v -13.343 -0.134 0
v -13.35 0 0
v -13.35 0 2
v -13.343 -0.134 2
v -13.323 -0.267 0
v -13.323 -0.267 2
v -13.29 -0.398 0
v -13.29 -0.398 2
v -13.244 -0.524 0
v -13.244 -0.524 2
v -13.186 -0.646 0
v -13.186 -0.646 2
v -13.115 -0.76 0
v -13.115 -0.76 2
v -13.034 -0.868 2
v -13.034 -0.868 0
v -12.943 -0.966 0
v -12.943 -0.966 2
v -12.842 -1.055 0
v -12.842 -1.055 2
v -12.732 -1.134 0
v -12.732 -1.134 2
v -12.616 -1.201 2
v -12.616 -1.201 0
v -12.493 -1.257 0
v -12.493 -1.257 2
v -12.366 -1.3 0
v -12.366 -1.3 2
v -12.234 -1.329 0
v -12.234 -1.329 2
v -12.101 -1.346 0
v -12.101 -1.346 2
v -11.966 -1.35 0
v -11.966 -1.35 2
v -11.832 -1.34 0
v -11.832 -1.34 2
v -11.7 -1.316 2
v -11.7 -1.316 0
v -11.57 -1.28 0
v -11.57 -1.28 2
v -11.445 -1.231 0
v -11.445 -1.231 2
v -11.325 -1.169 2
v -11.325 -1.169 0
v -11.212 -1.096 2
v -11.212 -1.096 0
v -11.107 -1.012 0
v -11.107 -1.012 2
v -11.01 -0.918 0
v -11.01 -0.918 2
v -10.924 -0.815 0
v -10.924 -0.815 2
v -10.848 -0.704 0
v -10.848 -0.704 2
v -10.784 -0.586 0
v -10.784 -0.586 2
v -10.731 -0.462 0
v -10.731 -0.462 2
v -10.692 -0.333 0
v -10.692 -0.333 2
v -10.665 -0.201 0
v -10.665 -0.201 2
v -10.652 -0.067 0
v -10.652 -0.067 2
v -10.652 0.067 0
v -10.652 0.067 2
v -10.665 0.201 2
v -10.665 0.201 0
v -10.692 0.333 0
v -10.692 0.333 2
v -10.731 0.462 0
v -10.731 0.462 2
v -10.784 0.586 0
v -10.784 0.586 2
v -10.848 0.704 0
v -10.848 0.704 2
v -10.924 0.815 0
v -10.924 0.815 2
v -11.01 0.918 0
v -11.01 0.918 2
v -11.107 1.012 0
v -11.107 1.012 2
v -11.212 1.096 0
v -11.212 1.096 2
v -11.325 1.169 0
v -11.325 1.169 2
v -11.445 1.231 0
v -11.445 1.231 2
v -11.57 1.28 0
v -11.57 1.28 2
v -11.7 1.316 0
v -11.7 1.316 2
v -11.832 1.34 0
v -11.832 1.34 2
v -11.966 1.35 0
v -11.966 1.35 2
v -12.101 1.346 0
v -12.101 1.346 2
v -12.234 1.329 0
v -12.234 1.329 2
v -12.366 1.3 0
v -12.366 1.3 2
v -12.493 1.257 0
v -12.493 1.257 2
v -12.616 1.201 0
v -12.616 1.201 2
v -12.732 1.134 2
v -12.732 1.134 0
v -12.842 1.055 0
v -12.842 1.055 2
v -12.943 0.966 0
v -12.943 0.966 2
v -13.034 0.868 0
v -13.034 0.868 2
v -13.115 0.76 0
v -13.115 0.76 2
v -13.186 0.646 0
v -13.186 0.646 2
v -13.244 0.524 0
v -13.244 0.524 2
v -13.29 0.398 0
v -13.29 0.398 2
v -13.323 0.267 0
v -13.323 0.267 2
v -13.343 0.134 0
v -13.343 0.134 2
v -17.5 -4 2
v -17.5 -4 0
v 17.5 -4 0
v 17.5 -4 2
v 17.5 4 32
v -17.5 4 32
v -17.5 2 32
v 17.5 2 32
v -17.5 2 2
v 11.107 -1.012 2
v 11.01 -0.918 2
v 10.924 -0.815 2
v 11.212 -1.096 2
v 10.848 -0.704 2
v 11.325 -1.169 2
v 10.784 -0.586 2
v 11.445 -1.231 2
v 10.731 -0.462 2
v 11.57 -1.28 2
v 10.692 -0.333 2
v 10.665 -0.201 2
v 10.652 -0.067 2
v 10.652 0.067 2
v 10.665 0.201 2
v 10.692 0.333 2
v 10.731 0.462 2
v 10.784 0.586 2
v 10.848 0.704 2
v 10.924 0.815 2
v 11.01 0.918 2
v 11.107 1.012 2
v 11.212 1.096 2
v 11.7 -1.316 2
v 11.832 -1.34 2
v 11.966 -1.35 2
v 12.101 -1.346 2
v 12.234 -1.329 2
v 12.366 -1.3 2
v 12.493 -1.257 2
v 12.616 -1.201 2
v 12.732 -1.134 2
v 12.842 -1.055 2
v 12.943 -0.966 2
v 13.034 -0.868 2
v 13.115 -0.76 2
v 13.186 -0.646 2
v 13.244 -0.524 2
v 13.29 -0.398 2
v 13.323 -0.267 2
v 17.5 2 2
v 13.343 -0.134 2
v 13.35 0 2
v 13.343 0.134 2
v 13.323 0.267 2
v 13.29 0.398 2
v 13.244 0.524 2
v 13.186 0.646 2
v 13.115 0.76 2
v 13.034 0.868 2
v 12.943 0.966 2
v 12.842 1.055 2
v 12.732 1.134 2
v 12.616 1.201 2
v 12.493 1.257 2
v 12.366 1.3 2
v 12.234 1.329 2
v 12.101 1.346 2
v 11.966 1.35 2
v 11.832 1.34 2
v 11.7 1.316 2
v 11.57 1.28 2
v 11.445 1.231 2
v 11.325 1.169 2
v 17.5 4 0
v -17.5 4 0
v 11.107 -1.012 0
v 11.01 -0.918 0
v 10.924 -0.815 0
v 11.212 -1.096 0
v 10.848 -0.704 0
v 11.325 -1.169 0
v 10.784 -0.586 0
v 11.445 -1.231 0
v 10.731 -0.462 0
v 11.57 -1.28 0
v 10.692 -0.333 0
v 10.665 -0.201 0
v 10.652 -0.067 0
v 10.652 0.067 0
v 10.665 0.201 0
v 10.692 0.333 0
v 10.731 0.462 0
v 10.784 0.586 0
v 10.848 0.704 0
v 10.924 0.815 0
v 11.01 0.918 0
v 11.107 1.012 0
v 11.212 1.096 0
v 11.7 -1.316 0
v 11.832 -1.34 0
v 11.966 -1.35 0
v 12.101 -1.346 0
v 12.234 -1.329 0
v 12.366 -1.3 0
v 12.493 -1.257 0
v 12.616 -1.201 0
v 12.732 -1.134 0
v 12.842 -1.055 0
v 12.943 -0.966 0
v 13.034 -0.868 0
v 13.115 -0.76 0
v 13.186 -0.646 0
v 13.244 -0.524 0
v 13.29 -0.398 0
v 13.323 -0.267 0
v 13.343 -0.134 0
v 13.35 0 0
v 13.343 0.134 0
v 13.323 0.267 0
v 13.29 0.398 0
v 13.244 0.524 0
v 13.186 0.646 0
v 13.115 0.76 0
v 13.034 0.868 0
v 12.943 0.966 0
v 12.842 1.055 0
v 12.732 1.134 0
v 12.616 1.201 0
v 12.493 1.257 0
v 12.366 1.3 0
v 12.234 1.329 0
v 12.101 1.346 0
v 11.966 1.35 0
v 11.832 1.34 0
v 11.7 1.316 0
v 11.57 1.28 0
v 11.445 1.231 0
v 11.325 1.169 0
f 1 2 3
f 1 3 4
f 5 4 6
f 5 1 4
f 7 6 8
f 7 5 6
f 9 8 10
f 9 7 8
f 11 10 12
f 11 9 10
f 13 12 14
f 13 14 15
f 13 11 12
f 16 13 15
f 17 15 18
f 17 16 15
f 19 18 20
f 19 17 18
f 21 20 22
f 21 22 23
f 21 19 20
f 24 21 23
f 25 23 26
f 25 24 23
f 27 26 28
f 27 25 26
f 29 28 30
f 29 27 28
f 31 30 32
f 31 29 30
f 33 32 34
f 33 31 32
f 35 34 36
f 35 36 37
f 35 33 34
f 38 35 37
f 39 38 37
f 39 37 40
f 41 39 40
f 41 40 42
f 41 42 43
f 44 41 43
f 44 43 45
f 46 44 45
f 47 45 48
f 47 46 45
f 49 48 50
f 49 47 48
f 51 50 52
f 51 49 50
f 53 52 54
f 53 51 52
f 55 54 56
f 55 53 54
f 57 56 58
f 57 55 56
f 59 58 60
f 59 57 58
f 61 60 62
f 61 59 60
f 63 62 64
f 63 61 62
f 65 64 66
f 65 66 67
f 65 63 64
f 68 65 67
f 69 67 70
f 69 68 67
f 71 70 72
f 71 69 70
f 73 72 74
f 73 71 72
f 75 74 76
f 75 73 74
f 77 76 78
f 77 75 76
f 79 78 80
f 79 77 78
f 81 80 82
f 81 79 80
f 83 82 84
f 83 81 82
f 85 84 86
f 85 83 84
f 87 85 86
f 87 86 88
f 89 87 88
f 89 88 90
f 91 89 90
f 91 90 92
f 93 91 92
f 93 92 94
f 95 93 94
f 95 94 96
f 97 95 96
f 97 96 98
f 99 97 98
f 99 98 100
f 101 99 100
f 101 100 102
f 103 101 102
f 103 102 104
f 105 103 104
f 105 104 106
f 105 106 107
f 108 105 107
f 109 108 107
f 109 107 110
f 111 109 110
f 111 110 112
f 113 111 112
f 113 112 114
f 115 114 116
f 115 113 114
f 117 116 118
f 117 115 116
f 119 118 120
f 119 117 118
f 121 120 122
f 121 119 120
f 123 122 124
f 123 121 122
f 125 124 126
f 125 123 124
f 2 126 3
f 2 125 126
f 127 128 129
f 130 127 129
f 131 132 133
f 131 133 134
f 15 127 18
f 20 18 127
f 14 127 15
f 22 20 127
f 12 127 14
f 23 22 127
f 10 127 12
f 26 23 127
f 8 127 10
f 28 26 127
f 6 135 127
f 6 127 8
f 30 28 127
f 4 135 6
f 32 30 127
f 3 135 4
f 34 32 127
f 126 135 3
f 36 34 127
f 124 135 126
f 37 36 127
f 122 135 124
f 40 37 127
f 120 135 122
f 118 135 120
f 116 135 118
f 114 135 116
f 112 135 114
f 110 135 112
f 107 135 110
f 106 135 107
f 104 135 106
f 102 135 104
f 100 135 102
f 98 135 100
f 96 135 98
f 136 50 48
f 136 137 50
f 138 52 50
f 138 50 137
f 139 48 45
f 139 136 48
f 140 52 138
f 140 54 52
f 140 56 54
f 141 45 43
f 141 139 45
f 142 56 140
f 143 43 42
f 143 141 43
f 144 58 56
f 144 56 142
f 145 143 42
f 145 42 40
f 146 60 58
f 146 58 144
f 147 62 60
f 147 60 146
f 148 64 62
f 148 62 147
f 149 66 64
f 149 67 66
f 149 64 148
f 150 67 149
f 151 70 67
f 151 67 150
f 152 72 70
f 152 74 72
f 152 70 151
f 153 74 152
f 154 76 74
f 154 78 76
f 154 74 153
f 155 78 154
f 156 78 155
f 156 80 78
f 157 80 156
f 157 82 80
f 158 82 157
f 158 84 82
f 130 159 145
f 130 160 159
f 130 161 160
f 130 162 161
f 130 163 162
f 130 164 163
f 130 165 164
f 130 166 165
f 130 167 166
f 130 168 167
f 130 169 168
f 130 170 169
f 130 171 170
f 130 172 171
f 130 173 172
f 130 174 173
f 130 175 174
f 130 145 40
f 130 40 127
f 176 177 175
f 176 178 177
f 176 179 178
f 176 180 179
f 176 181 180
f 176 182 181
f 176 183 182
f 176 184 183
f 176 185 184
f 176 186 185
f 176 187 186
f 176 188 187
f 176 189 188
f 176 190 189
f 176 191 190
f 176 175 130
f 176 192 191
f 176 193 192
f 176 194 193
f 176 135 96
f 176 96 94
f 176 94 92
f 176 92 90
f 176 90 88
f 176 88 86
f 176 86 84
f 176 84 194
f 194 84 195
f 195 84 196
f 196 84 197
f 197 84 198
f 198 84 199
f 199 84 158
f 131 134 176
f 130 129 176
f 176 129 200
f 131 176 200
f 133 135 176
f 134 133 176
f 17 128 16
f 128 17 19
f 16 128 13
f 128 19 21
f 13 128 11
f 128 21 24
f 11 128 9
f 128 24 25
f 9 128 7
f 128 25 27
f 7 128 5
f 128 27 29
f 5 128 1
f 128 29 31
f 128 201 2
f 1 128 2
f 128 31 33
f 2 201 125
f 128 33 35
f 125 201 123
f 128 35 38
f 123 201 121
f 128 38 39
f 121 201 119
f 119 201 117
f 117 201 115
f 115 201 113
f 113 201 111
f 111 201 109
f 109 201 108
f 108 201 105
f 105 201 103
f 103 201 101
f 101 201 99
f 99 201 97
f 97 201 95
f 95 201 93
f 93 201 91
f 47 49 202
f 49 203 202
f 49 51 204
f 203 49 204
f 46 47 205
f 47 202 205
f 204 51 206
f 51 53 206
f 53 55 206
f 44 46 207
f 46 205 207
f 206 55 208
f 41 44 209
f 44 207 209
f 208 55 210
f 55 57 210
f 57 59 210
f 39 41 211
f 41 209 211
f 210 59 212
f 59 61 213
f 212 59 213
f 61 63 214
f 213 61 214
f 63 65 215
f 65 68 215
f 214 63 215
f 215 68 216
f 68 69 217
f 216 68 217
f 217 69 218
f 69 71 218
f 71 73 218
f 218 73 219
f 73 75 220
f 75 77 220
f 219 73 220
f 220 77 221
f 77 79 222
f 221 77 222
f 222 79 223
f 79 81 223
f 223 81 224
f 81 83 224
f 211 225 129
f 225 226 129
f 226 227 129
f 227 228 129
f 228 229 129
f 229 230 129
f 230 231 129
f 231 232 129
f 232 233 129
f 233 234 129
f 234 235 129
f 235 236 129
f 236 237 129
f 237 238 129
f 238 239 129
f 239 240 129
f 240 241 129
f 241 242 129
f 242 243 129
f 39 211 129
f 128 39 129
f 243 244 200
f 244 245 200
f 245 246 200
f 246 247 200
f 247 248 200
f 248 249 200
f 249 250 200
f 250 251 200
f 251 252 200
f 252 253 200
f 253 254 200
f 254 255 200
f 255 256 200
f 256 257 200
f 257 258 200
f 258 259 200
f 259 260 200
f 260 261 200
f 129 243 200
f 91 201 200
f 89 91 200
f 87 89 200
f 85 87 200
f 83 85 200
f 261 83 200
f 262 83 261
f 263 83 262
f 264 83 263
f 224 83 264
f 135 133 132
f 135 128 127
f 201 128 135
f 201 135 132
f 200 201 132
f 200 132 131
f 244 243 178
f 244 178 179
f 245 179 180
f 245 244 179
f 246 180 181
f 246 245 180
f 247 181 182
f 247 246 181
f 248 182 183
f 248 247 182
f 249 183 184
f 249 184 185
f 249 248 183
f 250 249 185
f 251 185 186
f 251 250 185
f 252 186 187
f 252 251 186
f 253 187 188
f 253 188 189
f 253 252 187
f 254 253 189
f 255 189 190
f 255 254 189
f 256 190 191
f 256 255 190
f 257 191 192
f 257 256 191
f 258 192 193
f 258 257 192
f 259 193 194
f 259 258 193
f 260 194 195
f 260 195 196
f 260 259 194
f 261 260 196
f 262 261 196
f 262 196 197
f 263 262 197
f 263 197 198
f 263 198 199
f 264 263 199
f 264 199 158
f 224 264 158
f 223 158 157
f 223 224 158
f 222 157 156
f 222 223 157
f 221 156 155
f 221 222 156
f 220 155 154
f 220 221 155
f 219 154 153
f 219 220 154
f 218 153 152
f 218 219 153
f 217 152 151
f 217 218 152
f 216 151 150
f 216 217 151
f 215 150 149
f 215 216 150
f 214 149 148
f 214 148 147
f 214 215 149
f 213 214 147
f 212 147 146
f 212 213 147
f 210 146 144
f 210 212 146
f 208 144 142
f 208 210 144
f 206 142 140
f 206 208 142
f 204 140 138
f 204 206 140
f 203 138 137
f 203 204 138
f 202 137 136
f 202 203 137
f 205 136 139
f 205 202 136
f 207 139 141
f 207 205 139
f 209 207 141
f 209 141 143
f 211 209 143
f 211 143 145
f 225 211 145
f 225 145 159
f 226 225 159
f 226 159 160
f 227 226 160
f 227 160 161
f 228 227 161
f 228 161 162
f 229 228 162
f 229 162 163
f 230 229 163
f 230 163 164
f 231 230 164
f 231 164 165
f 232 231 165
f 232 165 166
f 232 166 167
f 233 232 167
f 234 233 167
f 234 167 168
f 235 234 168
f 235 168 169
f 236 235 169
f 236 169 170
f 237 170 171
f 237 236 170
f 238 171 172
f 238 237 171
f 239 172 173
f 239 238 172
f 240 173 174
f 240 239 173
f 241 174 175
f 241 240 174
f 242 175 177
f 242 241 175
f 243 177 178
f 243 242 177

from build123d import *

# Parameters (mm, degrees)
SKETCH1_W           = 35
SKETCH1_H           = 8
SKETCH1_R           = 1.35
BOSS_EXTRUDE1_DEPTH = 2
SKETCH2_W           = 35
SKETCH2_H           = 2
BOSS_EXTRUDE3_DEPTH = 30


with BuildPart() as part:
    # Sketch1 → Boss-Extrude1 (new body)
    with BuildSketch(Plane.XY):
        Rectangle(SKETCH1_W, SKETCH1_H)
        with Locations((12, 0)):
            Circle(SKETCH1_R, mode=Mode.SUBTRACT)
        with Locations(Location((-12, 0, 0), (0, 0, 180))):
            Circle(SKETCH1_R, mode=Mode.SUBTRACT)
    extrude(amount=BOSS_EXTRUDE1_DEPTH)

    # Sketch2 → Boss-Extrude3 (add)
    with BuildSketch(Plane.XY.offset(2)):
        with Locations((0, 3)):
            Rectangle(SKETCH2_W, SKETCH2_H)
    extrude(amount=BOSS_EXTRUDE3_DEPTH)


solid = part.part
